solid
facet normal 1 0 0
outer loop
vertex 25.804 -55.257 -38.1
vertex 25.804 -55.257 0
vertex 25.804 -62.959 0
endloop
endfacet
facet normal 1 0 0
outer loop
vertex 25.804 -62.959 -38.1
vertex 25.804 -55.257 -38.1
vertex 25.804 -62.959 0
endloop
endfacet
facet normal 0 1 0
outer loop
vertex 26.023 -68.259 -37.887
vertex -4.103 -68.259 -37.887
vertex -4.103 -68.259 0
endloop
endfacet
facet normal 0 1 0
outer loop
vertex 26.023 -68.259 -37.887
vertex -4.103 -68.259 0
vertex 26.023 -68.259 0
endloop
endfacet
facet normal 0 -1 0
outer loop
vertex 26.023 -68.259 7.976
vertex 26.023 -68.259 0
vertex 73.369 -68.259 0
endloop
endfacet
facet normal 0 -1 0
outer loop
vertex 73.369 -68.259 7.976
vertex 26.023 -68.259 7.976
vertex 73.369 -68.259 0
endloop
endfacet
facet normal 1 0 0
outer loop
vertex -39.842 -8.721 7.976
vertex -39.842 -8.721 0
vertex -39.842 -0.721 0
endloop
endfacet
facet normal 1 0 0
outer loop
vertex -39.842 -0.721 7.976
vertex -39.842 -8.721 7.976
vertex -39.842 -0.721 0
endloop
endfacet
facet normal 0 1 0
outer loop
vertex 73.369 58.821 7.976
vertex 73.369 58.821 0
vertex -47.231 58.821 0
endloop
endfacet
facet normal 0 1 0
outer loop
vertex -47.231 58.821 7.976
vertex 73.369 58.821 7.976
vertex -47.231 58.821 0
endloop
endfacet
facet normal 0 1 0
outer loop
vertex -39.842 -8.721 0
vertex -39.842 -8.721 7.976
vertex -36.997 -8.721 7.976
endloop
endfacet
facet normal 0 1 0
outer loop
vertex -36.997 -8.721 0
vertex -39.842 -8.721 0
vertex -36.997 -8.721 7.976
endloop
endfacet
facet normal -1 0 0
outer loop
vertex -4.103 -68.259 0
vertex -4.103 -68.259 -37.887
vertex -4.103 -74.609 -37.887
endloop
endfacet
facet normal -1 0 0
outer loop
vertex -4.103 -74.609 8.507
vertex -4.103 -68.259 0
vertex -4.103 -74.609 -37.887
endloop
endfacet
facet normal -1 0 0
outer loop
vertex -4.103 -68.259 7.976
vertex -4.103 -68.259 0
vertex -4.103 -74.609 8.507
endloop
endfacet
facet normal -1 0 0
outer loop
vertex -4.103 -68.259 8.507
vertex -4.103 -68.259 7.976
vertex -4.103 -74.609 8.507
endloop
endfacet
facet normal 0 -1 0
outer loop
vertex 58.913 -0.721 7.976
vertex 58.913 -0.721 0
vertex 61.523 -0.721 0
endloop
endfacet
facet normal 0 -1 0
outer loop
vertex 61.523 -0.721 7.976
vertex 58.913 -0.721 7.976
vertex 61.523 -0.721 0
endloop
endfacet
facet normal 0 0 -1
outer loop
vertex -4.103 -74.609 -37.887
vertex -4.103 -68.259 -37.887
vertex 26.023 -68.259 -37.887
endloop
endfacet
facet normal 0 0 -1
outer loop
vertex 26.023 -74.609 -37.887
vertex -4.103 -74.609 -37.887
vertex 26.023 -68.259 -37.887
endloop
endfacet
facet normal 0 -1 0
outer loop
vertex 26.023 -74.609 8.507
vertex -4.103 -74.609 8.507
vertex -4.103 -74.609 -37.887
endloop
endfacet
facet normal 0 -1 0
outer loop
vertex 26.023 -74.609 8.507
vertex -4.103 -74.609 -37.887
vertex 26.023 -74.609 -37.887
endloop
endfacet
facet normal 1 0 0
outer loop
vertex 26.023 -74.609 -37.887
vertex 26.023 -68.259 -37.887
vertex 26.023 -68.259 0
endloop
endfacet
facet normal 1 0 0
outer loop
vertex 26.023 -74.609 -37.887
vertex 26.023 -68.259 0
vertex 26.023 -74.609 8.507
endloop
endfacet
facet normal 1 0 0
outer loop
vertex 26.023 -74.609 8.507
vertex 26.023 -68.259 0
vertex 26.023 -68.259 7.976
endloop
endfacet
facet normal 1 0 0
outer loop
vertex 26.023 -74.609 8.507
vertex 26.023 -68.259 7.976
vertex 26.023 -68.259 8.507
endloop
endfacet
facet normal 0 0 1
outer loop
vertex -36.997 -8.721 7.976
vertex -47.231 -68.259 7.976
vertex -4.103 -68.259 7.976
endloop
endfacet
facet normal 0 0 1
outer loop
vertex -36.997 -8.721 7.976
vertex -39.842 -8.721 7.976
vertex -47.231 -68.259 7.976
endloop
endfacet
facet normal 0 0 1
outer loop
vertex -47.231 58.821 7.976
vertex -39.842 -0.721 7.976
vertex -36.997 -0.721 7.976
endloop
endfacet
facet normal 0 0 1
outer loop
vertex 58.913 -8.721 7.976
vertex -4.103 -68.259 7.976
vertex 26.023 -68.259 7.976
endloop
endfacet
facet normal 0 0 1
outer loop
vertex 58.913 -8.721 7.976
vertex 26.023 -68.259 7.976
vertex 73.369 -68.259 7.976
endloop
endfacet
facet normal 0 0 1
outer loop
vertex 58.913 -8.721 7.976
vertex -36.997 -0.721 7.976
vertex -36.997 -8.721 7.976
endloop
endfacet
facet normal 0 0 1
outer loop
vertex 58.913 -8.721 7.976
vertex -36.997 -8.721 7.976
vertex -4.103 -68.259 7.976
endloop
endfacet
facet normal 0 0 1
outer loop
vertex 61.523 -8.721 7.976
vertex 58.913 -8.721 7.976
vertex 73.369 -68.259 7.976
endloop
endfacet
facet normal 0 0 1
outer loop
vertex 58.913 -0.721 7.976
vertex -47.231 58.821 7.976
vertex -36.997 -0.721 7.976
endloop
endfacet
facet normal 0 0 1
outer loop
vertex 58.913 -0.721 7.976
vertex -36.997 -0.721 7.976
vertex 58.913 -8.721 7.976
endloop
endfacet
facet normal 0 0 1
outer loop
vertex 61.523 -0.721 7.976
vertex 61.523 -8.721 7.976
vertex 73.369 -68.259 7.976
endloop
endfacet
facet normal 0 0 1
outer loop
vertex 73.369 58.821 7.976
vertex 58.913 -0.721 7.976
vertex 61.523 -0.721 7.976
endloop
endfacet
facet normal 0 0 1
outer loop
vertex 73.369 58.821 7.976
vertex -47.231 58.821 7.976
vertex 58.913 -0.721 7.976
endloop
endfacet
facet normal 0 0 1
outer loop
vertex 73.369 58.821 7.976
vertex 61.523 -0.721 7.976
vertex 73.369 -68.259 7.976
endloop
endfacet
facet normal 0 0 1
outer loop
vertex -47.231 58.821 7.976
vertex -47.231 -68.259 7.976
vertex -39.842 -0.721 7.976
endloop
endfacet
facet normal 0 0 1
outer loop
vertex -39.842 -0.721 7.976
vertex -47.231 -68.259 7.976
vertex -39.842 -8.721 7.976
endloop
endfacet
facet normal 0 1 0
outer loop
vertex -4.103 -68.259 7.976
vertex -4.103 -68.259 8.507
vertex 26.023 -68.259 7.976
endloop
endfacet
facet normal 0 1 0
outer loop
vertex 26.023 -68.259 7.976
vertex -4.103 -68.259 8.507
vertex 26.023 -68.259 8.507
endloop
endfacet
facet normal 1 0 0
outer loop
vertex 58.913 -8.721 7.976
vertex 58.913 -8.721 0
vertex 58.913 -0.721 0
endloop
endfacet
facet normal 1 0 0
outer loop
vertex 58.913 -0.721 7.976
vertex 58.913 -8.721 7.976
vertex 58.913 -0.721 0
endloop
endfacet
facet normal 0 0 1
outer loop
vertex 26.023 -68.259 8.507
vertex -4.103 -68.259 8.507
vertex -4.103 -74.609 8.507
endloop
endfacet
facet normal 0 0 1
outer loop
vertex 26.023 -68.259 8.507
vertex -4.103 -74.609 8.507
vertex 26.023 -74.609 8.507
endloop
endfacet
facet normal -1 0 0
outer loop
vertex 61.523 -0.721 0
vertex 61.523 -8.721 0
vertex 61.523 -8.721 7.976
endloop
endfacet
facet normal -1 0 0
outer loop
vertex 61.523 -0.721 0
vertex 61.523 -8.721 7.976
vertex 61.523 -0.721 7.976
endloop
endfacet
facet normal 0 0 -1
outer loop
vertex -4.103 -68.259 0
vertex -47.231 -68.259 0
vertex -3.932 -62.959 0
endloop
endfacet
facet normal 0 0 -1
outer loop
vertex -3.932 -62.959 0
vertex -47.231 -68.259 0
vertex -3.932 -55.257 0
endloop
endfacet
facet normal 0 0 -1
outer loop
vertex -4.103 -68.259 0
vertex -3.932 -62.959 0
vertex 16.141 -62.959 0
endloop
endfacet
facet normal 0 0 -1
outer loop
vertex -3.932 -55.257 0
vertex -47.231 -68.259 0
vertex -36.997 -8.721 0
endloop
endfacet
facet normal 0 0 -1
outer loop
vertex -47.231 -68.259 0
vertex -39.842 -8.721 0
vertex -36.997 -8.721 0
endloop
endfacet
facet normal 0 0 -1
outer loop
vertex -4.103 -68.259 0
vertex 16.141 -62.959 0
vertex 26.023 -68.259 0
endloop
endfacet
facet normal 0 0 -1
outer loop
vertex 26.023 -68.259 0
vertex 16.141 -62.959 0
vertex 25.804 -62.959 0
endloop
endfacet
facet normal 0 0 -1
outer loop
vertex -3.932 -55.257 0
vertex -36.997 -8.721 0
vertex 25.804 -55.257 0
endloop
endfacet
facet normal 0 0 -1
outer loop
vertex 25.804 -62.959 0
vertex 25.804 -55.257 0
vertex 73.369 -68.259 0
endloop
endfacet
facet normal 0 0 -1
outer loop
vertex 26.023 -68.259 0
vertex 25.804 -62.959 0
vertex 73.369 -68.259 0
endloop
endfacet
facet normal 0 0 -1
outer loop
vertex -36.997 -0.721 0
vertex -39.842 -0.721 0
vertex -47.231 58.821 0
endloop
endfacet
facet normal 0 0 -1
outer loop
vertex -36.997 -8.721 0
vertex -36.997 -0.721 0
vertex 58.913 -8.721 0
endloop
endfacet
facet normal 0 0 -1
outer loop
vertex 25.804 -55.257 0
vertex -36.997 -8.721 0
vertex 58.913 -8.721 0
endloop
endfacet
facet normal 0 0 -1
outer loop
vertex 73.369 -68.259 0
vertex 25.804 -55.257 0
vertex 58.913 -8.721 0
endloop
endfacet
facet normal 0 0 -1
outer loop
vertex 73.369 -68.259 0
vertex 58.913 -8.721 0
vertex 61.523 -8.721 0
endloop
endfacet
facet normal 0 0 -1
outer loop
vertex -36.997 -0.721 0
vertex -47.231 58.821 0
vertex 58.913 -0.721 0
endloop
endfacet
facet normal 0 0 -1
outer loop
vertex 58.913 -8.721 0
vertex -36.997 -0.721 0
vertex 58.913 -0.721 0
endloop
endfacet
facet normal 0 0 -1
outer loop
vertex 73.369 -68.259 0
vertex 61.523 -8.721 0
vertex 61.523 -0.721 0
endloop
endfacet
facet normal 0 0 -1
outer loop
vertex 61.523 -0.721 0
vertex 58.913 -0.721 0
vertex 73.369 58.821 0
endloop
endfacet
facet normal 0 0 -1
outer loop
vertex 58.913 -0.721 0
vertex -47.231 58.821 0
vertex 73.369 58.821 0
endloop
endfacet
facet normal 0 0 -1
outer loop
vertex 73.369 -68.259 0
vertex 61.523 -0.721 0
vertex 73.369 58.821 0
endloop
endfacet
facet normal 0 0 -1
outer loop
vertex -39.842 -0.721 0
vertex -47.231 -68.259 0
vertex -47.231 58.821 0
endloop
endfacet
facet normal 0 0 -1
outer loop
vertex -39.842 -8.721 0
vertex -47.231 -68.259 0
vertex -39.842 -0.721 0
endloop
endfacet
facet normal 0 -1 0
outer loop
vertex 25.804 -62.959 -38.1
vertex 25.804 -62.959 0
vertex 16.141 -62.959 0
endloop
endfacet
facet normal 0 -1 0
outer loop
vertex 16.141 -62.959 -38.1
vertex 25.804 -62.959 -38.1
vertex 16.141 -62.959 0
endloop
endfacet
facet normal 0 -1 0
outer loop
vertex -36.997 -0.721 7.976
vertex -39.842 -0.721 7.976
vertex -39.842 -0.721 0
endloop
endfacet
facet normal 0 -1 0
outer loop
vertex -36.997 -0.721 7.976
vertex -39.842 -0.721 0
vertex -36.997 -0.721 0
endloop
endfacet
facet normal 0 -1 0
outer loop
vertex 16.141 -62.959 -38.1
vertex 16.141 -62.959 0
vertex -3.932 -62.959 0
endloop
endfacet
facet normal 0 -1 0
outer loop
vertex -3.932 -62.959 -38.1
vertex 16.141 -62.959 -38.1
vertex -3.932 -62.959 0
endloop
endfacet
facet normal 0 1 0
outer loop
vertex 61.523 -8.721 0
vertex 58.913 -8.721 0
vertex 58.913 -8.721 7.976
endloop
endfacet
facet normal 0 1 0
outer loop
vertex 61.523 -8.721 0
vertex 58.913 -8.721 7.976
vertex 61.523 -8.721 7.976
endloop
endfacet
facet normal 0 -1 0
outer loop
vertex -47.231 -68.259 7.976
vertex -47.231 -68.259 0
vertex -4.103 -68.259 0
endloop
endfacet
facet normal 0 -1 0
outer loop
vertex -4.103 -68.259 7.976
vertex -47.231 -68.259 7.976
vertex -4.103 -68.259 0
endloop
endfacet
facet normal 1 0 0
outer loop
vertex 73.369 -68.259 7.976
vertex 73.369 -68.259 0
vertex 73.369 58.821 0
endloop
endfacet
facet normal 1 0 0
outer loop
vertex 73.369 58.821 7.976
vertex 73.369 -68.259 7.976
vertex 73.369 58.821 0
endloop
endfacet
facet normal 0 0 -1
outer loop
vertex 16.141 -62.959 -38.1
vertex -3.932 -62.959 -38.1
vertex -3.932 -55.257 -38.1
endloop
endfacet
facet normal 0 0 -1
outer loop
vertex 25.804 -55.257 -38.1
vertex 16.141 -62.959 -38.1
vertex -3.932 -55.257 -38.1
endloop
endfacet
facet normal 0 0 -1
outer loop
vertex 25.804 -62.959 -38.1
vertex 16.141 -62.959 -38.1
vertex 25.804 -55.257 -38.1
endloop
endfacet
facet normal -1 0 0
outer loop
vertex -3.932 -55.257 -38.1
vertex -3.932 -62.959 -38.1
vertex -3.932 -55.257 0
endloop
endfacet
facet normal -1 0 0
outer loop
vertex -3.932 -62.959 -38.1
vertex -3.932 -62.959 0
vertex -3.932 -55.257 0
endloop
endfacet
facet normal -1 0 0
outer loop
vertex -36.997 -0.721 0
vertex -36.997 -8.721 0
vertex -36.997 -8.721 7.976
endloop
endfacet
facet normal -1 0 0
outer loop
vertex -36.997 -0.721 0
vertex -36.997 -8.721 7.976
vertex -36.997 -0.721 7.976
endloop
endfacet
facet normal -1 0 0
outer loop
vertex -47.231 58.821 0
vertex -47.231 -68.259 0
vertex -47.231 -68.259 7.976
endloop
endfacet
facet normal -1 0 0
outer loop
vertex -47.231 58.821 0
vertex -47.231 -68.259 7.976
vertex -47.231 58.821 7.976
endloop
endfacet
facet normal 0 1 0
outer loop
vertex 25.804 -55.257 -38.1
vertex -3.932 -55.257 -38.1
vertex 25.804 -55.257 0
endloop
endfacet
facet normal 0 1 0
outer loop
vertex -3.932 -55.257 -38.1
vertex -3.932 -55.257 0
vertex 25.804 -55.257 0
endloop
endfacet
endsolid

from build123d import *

# Parameters (mm, degrees)
F0_W     = 47.2308259338
F0_H     = 127.08
F0_W_2   = 2.84589082
F0_H_2   = 8
F0_W_3   = 73.3691740662
F0_W_4   = 2.6096887887
F1_DEPTH = 7.9756
F3_W     = 30.1258238032
F3_H     = 46.3937623426
F4_DEPTH = 6.35
F6_W     = 9.6924505796
F6_H     = 2.8718380383
F7_DEPTH = 25.4
F8_DEPTH = 12.7


with BuildPart() as f1:
    # F0 (on Top) → F1 (new body)
    with BuildSketch(Plane.XY):
        with Locations((-23.6154129669, -4.7186717279)):
            Rectangle(F0_W, F0_H)
        with Locations((-38.4195260704, -4.7210717279)):
            Rectangle(F0_W_2, F0_H_2, mode=Mode.SUBTRACT)
        with Locations((36.6845870331, -4.7186717279)):
            Rectangle(F0_W_3, F0_H)
        with Locations((60.218263734, -4.7210717279)):
            Rectangle(F0_W_4, F0_H_2, mode=Mode.SUBTRACT)
    extrude(amount=F1_DEPTH)

    # F3 (on offset) → F4 (join)
    with BuildSketch(Plane.XZ.offset(68.2586717279)):
        with Locations((10.9603698365, -14.6902077831)):
            Rectangle(F3_W, F3_H)
    extrude(amount=F4_DEPTH)

    # F6 (on offset) → F7 (join)
    with BuildSketch(Plane(origin=(0, 0, 0), x_dir=(1, 0, 0), z_dir=(0, 0, -1))):
        with Locations((11.2944499124, 61.5227527088)):
            Rectangle(F6_W, F6_H)
        Polygon((6.4482246226, 60.0868336896), (6.4482246226, 62.9586717279), (-3.9315340109, 62.9586717279), (-3.9315340109, 55.2566833794), (25.8039161563, 55.2566833794), (25.8039161563, 62.9586717279), (16.1406752022, 62.9586717279), (16.1406752022, 60.0868336896), align=None)
    extrude(amount=F7_DEPTH)

    # F8 (add): a face of the model
    f8_faces = [f1.faces().sort_by_distance(p)[0] for p in [
        (10.9361910727, -59.1076775537, -25.4),
    ]]
    extrude(f8_faces, amount=F8_DEPTH)


solid = f1.part
